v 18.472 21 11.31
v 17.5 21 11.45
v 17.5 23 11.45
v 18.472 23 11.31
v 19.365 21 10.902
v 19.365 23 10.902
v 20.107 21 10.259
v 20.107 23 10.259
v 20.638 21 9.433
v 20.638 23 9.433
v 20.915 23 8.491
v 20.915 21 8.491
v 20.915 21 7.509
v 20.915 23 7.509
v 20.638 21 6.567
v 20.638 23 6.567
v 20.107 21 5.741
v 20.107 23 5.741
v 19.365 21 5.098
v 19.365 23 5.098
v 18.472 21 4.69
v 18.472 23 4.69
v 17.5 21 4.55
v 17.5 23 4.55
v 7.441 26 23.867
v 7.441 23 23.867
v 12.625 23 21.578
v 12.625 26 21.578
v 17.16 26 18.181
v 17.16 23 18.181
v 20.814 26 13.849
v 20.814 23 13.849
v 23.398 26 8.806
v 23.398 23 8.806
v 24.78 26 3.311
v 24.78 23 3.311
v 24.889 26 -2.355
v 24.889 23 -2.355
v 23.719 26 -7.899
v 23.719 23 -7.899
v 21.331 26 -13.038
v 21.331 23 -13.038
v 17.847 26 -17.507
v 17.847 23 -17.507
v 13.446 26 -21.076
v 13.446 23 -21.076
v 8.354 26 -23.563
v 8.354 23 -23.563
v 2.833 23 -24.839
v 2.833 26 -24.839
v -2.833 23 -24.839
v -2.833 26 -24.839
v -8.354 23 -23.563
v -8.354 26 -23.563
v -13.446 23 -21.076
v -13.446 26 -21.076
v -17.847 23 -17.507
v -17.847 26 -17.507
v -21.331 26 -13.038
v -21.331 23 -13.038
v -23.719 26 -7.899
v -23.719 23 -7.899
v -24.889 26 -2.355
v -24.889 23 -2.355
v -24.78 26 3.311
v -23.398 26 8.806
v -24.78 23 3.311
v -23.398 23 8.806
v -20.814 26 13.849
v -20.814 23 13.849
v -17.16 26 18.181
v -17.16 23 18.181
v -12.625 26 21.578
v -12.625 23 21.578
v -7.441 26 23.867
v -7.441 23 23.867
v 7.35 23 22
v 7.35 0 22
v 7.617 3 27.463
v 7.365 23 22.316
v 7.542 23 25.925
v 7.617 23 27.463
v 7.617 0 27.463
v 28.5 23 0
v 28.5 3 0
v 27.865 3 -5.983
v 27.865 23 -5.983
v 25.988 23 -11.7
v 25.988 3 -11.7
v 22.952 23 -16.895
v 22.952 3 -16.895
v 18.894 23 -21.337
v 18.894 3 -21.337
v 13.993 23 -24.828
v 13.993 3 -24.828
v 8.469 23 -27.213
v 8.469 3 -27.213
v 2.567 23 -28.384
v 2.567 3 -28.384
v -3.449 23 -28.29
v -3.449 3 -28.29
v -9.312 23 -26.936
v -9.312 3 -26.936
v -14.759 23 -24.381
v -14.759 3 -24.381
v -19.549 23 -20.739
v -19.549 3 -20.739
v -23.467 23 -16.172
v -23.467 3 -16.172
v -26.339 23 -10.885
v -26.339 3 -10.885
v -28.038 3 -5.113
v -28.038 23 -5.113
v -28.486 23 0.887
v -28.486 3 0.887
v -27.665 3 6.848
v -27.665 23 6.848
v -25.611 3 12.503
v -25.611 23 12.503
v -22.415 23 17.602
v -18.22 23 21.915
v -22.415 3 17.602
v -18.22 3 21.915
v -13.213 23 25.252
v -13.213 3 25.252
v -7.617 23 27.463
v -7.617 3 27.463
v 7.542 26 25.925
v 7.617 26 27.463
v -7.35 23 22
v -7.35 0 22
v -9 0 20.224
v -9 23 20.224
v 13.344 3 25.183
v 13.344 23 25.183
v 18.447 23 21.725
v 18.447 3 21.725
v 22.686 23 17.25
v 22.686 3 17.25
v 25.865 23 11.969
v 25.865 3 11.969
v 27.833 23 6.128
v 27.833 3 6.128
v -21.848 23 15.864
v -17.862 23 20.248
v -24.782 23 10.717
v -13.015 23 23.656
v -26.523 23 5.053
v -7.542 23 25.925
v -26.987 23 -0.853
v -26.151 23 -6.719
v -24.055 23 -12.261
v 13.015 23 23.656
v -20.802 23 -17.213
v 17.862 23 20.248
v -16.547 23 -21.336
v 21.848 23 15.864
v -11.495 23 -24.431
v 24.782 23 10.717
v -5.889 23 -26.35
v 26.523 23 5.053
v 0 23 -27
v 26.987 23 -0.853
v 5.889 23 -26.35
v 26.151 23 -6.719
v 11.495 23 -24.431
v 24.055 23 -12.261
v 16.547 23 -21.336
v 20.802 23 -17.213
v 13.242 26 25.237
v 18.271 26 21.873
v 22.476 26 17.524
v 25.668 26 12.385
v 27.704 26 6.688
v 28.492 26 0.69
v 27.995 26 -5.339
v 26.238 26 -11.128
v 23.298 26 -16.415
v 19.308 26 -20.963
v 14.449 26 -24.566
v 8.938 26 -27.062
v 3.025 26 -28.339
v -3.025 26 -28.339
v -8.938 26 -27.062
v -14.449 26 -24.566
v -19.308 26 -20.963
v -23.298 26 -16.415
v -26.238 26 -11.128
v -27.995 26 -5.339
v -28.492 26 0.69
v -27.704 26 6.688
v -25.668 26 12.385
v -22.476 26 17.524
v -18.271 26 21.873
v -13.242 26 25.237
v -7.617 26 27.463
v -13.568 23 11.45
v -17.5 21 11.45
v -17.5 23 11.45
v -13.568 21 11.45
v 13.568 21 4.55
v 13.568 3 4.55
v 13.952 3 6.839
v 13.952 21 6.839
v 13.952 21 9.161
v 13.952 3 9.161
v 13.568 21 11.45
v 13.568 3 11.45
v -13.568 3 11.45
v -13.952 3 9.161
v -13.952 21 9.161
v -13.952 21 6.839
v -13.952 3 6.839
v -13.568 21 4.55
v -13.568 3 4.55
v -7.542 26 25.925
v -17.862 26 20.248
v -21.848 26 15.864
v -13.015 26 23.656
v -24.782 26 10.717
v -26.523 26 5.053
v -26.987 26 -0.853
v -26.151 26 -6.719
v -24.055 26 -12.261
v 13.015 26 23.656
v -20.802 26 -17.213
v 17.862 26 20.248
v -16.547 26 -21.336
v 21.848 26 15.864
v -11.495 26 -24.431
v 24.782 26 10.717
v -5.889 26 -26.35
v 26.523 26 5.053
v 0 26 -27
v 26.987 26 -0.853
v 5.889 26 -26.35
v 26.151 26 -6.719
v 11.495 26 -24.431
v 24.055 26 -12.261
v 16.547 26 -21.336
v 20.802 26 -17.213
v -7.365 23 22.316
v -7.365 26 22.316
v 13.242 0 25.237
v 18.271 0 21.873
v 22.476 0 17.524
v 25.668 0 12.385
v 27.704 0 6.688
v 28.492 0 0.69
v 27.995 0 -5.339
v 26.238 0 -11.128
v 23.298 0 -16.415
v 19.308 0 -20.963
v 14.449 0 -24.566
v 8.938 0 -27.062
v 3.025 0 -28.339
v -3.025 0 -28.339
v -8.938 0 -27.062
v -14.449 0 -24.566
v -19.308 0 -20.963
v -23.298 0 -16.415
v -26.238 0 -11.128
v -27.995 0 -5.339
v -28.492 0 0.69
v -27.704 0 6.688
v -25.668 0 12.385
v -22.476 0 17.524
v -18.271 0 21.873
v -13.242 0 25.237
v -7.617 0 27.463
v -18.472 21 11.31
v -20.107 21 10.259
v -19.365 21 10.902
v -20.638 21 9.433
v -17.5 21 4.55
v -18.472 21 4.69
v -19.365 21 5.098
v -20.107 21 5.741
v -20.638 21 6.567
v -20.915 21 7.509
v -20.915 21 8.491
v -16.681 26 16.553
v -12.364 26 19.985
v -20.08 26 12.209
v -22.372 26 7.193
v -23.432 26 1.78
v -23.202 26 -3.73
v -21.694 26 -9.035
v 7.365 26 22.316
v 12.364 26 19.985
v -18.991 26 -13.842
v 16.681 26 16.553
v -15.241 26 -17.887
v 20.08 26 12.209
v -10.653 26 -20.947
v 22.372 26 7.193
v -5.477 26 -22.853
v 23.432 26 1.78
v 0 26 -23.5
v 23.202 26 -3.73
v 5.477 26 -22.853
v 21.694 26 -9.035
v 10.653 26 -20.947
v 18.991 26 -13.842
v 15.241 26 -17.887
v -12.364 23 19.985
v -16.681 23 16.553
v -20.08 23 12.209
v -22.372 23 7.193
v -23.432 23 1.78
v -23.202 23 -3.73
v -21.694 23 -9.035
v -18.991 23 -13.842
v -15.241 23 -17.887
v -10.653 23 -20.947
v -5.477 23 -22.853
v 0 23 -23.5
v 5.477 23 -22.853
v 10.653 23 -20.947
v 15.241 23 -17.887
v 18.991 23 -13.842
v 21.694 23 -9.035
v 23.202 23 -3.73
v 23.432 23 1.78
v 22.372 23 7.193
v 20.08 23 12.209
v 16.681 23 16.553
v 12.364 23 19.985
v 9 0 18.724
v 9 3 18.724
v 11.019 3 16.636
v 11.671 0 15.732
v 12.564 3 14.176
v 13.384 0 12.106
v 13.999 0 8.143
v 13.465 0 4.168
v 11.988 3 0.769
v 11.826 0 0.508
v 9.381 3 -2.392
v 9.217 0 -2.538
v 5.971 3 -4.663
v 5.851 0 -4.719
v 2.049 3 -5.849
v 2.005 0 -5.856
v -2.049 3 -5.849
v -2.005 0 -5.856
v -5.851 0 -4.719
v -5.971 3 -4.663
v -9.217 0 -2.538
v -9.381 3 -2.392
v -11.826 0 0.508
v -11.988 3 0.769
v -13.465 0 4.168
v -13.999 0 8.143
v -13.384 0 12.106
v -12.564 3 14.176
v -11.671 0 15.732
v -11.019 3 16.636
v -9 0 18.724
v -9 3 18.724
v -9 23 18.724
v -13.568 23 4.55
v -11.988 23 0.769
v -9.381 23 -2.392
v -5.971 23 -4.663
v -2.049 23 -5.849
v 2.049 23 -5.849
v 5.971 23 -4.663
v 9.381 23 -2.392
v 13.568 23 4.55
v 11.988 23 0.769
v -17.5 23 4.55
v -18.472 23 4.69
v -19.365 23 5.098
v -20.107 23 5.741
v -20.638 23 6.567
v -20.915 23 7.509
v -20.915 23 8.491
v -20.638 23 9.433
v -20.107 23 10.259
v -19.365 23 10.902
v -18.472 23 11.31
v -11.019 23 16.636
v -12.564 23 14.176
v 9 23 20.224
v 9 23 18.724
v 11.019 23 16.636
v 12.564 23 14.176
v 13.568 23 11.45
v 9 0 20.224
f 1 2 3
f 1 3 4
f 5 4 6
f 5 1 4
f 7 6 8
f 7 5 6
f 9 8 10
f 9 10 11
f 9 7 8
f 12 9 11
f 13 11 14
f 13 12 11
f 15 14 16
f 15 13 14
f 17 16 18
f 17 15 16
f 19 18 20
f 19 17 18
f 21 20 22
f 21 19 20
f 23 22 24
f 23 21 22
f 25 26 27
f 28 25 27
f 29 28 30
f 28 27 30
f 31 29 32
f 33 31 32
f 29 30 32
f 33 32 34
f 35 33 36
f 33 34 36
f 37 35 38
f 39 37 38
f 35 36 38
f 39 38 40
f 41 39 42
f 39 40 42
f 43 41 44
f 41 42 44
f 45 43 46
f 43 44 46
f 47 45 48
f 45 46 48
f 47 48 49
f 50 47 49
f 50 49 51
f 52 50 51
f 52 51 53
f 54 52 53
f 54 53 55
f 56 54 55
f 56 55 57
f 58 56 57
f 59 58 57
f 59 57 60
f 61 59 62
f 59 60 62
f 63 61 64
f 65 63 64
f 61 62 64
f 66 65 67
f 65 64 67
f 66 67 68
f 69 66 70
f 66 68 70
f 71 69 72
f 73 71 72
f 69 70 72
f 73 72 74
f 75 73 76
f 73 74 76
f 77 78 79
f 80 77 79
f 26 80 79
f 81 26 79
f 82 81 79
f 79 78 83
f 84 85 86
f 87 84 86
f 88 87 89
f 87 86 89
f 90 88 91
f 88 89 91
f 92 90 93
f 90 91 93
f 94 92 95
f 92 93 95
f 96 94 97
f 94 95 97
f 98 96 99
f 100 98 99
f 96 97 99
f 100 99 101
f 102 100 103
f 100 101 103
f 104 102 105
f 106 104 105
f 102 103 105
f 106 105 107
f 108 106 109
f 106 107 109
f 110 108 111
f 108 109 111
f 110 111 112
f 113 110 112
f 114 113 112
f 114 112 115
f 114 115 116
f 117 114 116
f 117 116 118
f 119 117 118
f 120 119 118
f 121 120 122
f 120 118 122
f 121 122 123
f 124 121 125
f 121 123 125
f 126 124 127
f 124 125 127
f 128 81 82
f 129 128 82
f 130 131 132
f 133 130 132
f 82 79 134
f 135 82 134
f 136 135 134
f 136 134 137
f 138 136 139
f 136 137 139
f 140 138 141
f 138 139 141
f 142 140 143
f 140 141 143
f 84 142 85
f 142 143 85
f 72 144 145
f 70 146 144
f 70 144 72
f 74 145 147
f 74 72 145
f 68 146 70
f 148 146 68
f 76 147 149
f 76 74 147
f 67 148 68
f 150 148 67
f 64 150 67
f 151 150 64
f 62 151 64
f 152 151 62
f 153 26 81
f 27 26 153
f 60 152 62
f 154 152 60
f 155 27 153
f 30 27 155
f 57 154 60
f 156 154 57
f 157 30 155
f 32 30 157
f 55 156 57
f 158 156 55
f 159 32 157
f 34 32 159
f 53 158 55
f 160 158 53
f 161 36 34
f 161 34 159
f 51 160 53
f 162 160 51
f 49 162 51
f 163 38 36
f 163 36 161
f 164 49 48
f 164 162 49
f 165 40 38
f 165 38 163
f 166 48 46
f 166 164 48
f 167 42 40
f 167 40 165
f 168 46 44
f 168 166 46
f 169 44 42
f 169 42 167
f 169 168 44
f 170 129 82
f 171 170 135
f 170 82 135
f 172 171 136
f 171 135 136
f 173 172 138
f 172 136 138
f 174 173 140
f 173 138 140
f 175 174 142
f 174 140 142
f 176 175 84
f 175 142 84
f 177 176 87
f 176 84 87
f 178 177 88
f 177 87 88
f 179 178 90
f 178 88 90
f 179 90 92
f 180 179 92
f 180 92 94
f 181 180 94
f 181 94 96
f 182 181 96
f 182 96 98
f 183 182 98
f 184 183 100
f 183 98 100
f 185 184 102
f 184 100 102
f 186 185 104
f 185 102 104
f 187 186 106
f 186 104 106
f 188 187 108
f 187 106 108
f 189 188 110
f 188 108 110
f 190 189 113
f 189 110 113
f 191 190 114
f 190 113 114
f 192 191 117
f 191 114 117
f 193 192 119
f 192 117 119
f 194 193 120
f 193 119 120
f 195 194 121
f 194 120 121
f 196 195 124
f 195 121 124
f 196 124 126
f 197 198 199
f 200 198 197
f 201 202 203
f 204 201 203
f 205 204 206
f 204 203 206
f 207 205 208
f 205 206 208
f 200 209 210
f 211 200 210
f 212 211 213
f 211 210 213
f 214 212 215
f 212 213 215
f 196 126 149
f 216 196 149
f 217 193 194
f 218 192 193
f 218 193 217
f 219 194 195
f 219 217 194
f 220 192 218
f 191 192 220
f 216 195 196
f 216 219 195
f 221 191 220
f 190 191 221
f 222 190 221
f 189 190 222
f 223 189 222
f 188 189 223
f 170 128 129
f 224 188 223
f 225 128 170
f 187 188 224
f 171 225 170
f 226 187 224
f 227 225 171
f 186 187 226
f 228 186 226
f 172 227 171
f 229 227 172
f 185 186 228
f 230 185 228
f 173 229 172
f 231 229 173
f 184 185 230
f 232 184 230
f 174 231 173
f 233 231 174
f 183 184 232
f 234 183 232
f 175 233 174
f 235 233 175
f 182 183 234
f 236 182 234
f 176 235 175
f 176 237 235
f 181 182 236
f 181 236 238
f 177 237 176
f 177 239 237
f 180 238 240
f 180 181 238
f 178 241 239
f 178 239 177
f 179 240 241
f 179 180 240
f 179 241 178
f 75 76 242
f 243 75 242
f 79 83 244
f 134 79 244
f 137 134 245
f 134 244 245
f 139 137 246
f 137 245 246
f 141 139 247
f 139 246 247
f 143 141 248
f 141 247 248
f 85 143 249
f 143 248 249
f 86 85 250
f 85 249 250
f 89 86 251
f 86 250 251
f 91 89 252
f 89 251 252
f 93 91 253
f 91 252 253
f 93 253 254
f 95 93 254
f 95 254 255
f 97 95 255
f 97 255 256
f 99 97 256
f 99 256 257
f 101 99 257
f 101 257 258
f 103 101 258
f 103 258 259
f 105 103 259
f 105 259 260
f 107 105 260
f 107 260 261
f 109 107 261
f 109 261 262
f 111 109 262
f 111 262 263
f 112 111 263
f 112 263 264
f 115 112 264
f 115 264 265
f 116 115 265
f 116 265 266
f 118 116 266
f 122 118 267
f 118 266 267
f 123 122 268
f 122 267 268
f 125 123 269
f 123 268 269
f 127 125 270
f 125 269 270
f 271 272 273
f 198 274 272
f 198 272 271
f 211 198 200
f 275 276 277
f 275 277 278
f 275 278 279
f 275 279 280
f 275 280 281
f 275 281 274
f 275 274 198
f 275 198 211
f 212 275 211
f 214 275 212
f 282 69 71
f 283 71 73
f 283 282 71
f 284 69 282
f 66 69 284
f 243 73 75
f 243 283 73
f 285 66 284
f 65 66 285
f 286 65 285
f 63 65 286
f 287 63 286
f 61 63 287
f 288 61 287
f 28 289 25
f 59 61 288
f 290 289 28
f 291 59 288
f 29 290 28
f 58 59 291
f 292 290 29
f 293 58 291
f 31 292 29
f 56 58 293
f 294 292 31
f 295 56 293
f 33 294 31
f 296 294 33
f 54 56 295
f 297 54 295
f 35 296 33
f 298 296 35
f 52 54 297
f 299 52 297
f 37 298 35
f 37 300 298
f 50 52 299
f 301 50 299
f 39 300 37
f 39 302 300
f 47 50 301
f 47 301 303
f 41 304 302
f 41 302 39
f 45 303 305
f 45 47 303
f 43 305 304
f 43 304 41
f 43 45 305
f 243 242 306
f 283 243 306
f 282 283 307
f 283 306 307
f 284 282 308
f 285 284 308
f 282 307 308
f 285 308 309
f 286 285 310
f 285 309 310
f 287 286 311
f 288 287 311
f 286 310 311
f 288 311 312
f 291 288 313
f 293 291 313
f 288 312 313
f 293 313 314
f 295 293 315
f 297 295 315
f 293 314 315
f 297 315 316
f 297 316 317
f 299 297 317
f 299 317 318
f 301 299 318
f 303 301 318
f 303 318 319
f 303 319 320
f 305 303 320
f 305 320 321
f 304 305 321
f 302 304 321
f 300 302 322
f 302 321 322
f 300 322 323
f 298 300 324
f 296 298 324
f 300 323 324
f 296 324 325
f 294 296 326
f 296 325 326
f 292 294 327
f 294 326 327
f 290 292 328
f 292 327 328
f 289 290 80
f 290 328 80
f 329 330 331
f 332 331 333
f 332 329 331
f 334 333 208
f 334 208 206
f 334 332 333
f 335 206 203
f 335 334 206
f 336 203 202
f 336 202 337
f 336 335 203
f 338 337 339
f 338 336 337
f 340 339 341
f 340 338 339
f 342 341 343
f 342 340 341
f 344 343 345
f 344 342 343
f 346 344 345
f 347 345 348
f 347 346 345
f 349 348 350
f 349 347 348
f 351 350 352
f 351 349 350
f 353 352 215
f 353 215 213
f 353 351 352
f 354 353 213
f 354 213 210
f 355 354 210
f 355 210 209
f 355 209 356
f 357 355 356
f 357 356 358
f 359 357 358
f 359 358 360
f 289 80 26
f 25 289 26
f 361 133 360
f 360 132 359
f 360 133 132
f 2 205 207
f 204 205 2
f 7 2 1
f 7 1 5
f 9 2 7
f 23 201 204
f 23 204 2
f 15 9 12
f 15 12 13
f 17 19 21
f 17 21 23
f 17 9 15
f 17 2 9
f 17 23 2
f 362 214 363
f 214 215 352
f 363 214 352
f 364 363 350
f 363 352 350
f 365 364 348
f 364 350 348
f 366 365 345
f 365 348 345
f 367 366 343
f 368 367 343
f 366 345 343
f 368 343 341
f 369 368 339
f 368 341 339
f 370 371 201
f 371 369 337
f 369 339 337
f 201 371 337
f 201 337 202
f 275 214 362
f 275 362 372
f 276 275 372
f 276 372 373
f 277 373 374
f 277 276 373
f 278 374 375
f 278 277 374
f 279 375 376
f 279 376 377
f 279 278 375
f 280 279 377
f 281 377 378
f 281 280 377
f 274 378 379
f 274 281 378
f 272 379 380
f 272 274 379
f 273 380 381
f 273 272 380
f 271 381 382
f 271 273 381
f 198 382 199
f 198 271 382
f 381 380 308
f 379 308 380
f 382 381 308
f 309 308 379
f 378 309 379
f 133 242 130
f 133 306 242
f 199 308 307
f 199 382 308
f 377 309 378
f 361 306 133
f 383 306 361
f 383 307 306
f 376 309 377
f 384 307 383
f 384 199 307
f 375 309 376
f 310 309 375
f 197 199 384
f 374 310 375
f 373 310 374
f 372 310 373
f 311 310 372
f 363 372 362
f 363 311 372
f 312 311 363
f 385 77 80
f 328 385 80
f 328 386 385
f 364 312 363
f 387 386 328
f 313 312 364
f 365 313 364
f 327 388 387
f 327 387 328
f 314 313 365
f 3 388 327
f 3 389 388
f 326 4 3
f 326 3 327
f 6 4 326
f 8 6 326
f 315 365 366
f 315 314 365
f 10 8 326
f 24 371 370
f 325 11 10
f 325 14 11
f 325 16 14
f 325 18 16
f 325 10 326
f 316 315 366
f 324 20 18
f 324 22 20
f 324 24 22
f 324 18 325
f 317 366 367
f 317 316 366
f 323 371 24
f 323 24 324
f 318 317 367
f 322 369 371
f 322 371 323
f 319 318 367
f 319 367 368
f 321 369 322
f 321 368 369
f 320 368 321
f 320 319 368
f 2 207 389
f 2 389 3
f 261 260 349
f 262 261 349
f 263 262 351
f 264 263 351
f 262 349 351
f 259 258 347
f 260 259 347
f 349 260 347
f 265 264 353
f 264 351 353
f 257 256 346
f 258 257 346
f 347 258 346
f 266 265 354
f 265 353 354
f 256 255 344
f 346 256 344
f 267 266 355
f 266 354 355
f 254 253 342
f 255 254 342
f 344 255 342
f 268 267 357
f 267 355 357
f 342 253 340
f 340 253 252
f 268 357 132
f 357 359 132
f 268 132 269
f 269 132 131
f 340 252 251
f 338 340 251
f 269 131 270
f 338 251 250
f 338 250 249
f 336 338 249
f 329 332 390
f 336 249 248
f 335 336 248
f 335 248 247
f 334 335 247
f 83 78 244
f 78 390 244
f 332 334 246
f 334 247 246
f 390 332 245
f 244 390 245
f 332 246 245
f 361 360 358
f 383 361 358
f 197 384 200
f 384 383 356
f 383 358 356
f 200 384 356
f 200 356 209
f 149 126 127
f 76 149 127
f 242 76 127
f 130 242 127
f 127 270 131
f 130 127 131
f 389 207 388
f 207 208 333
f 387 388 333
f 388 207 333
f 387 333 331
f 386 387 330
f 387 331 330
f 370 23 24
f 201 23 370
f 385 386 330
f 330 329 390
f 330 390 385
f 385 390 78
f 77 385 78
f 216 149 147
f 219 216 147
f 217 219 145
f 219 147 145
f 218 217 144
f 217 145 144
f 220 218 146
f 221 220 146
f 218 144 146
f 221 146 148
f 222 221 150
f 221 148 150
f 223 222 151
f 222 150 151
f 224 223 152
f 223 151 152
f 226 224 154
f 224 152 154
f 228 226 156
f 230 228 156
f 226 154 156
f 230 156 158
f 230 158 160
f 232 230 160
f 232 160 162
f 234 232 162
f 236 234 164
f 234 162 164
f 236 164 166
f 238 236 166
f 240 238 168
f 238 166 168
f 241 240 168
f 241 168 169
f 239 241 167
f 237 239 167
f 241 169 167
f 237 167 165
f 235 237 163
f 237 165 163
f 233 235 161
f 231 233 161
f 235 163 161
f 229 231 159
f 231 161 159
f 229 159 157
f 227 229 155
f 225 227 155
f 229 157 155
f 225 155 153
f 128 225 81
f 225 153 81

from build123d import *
from build123d.topology import SkipClean

# Parameters (mm, degrees)
SKETCH1_R           = 28.5
BOSS_EXTRUDE1_DEPTH = 3
BOSS_EXTRUDE4_DEPTH = 20
BOSS_EXTRUDE7_DEPTH = 3
CUT_EXTRUDE1_START  = -2
CUT_EXTRUDE1_DEPTH  = 2
CUT_EXTRUDE5_START  = -4
CUT_EXTRUDE5_DEPTH  = 4


with BuildPart() as part:
    # Sketch1 → Boss-Extrude1 (new body)
    with BuildSketch(Plane(origin=(0, 0, 0), x_dir=(1, 0, 0), z_dir=(0, 1, 0))):
        Circle(SKETCH1_R)
    extrude(amount=BOSS_EXTRUDE1_DEPTH)

    # Sketch2 → Boss-Extrude4 (add)
    with BuildSketch(Plane(origin=(0, 3, 0), x_dir=(1, 0, 0), z_dir=(0, 1, 0))):
        with BuildLine():
            Line((-9, -20.223805295), (-9, -18.723805295))
            ThreePointArc((-9, -18.723805295), (-11.855740218, -15.445899804), (-13.568253388, -11.45))
            ThreePointArc((-13.568253388, -11.45), (-14, -8), (-13.568253388, -4.55))
            ThreePointArc((-13.568253388, -4.55), (0, 6), (13.568253388, -4.55))
            ThreePointArc((13.568253388, -4.55), (14, -8), (13.568253388, -11.45))
            ThreePointArc((13.568253388, -11.45), (11.855740218, -15.445899804), (9, -18.723805295))
            Line((9, -18.723805295), (9, -20.223805295))
            Line((9, -20.223805295), (7.35, -22))
            Line((7.35, -22), (7.617272727, -27.463196394))
            ThreePointArc((7.617272727, -27.463196394), (22.686364547, -17.250474302), (28.5, 0))
            ThreePointArc((28.5, 0), (-17.250474302, 22.686364547), (-7.617272727, -27.463196394))
            Line((-7.617272727, -27.463196394), (-7.35, -22))
            Line((-7.35, -22), (-9, -20.223805295))
        make_face()
    extrude(amount=BOSS_EXTRUDE4_DEPTH)

    # Sketch5 → Boss-Extrude7 (add)
    with BuildSketch(Plane(origin=(0, 23, 0), x_dir=(1, 0, 0), z_dir=(0, 1, 0))):
        with BuildLine():
            ThreePointArc((7.617272727, -27.463196394), (0, 28.5), (-7.617272727, -27.463196394))
            Line((-7.617272727, -27.463196394), (-7.542031899, -25.92523394))
            ThreePointArc((-7.542031899, -25.92523394), (0, 27), (7.542031899, -25.92523394))
            Line((7.542031899, -25.92523394), (7.617272727, -27.463196394))
        make_face()
        with BuildLine():
            ThreePointArc((7.441330866, -23.866851383), (0, 25), (-7.441330866, -23.866851383))
            Line((-7.441330866, -23.866851383), (-7.365455329, -22.315915124))
            ThreePointArc((-7.365455329, -22.315915124), (0, 23.5), (7.365455329, -22.315915124))
            Line((7.365455329, -22.315915124), (7.441330866, -23.866851383))
        make_face()
    extrude(amount=BOSS_EXTRUDE7_DEPTH)

    # Sketch6 → Cut-Extrude1 (cut)
    with SkipClean():  # the faces are left unmerged after this step: merging them gives an invalid solid
        with BuildSketch(Plane(origin=(0, 23, 0), x_dir=(1, 0, 0), z_dir=(0, 1, 0)).offset(CUT_EXTRUDE1_START)):
            with BuildLine():
                Line((13.568253388, -11.45), (17.5, -11.45))
                ThreePointArc((17.5, -11.45), (20.95, -8), (17.5, -4.55))
                Line((17.5, -4.55), (13.568253388, -4.55))
                ThreePointArc((13.568253388, -4.55), (0, 6), (-13.568253388, -4.55))
                Line((-13.568253388, -4.55), (-17.5, -4.55))
                ThreePointArc((-17.5, -4.55), (-20.95, -8), (-17.5, -11.45))
                Line((-17.5, -11.45), (-13.568253388, -11.45))
                ThreePointArc((-13.568253388, -11.45), (-11.855740218, -15.445899804), (-9, -18.723805295))
                Line((-9, -18.723805295), (-9, -20.223805295))
                Line((-9, -20.223805295), (-7.35, -22))
                Line((-7.35, -22), (-7.35, -25))
                Line((-7.35, -25), (7.35, -25))
                Line((7.35, -25), (7.35, -22))
                Line((7.35, -22), (9, -20.223805295))
                Line((9, -20.223805295), (9, -18.723805295))
                ThreePointArc((9, -18.723805295), (11.855740218, -15.445899804), (13.568253388, -11.45))
            make_face()
        extrude(amount=CUT_EXTRUDE1_DEPTH, mode=Mode.SUBTRACT)

    # Sketch7 → Cut-Extrude5 (cut)
    with BuildSketch(Plane(origin=(0, 3, 0), x_dir=(1, 0, 0), z_dir=(0, 1, 0)).offset(CUT_EXTRUDE5_START)):
        with BuildLine():
            Line((-9, -20.223805295), (-7.35, -22))
            Line((-7.35, -22), (-7.617272727, -27.463196394))
            ThreePointArc((-7.617272727, -27.463196394), (0, -28.5), (7.617272727, -27.463196394))
            Line((7.617272727, -27.463196394), (7.35, -22))
            Line((7.35, -22), (9, -20.223805295))
            Line((9, -20.223805295), (9, -18.723805295))
            ThreePointArc((9, -18.723805295), (0, 6), (-9, -18.723805295))
            Line((-9, -18.723805295), (-9, -20.223805295))
        make_face()
    extrude(amount=CUT_EXTRUDE5_DEPTH, mode=Mode.SUBTRACT)


solid = part.part
